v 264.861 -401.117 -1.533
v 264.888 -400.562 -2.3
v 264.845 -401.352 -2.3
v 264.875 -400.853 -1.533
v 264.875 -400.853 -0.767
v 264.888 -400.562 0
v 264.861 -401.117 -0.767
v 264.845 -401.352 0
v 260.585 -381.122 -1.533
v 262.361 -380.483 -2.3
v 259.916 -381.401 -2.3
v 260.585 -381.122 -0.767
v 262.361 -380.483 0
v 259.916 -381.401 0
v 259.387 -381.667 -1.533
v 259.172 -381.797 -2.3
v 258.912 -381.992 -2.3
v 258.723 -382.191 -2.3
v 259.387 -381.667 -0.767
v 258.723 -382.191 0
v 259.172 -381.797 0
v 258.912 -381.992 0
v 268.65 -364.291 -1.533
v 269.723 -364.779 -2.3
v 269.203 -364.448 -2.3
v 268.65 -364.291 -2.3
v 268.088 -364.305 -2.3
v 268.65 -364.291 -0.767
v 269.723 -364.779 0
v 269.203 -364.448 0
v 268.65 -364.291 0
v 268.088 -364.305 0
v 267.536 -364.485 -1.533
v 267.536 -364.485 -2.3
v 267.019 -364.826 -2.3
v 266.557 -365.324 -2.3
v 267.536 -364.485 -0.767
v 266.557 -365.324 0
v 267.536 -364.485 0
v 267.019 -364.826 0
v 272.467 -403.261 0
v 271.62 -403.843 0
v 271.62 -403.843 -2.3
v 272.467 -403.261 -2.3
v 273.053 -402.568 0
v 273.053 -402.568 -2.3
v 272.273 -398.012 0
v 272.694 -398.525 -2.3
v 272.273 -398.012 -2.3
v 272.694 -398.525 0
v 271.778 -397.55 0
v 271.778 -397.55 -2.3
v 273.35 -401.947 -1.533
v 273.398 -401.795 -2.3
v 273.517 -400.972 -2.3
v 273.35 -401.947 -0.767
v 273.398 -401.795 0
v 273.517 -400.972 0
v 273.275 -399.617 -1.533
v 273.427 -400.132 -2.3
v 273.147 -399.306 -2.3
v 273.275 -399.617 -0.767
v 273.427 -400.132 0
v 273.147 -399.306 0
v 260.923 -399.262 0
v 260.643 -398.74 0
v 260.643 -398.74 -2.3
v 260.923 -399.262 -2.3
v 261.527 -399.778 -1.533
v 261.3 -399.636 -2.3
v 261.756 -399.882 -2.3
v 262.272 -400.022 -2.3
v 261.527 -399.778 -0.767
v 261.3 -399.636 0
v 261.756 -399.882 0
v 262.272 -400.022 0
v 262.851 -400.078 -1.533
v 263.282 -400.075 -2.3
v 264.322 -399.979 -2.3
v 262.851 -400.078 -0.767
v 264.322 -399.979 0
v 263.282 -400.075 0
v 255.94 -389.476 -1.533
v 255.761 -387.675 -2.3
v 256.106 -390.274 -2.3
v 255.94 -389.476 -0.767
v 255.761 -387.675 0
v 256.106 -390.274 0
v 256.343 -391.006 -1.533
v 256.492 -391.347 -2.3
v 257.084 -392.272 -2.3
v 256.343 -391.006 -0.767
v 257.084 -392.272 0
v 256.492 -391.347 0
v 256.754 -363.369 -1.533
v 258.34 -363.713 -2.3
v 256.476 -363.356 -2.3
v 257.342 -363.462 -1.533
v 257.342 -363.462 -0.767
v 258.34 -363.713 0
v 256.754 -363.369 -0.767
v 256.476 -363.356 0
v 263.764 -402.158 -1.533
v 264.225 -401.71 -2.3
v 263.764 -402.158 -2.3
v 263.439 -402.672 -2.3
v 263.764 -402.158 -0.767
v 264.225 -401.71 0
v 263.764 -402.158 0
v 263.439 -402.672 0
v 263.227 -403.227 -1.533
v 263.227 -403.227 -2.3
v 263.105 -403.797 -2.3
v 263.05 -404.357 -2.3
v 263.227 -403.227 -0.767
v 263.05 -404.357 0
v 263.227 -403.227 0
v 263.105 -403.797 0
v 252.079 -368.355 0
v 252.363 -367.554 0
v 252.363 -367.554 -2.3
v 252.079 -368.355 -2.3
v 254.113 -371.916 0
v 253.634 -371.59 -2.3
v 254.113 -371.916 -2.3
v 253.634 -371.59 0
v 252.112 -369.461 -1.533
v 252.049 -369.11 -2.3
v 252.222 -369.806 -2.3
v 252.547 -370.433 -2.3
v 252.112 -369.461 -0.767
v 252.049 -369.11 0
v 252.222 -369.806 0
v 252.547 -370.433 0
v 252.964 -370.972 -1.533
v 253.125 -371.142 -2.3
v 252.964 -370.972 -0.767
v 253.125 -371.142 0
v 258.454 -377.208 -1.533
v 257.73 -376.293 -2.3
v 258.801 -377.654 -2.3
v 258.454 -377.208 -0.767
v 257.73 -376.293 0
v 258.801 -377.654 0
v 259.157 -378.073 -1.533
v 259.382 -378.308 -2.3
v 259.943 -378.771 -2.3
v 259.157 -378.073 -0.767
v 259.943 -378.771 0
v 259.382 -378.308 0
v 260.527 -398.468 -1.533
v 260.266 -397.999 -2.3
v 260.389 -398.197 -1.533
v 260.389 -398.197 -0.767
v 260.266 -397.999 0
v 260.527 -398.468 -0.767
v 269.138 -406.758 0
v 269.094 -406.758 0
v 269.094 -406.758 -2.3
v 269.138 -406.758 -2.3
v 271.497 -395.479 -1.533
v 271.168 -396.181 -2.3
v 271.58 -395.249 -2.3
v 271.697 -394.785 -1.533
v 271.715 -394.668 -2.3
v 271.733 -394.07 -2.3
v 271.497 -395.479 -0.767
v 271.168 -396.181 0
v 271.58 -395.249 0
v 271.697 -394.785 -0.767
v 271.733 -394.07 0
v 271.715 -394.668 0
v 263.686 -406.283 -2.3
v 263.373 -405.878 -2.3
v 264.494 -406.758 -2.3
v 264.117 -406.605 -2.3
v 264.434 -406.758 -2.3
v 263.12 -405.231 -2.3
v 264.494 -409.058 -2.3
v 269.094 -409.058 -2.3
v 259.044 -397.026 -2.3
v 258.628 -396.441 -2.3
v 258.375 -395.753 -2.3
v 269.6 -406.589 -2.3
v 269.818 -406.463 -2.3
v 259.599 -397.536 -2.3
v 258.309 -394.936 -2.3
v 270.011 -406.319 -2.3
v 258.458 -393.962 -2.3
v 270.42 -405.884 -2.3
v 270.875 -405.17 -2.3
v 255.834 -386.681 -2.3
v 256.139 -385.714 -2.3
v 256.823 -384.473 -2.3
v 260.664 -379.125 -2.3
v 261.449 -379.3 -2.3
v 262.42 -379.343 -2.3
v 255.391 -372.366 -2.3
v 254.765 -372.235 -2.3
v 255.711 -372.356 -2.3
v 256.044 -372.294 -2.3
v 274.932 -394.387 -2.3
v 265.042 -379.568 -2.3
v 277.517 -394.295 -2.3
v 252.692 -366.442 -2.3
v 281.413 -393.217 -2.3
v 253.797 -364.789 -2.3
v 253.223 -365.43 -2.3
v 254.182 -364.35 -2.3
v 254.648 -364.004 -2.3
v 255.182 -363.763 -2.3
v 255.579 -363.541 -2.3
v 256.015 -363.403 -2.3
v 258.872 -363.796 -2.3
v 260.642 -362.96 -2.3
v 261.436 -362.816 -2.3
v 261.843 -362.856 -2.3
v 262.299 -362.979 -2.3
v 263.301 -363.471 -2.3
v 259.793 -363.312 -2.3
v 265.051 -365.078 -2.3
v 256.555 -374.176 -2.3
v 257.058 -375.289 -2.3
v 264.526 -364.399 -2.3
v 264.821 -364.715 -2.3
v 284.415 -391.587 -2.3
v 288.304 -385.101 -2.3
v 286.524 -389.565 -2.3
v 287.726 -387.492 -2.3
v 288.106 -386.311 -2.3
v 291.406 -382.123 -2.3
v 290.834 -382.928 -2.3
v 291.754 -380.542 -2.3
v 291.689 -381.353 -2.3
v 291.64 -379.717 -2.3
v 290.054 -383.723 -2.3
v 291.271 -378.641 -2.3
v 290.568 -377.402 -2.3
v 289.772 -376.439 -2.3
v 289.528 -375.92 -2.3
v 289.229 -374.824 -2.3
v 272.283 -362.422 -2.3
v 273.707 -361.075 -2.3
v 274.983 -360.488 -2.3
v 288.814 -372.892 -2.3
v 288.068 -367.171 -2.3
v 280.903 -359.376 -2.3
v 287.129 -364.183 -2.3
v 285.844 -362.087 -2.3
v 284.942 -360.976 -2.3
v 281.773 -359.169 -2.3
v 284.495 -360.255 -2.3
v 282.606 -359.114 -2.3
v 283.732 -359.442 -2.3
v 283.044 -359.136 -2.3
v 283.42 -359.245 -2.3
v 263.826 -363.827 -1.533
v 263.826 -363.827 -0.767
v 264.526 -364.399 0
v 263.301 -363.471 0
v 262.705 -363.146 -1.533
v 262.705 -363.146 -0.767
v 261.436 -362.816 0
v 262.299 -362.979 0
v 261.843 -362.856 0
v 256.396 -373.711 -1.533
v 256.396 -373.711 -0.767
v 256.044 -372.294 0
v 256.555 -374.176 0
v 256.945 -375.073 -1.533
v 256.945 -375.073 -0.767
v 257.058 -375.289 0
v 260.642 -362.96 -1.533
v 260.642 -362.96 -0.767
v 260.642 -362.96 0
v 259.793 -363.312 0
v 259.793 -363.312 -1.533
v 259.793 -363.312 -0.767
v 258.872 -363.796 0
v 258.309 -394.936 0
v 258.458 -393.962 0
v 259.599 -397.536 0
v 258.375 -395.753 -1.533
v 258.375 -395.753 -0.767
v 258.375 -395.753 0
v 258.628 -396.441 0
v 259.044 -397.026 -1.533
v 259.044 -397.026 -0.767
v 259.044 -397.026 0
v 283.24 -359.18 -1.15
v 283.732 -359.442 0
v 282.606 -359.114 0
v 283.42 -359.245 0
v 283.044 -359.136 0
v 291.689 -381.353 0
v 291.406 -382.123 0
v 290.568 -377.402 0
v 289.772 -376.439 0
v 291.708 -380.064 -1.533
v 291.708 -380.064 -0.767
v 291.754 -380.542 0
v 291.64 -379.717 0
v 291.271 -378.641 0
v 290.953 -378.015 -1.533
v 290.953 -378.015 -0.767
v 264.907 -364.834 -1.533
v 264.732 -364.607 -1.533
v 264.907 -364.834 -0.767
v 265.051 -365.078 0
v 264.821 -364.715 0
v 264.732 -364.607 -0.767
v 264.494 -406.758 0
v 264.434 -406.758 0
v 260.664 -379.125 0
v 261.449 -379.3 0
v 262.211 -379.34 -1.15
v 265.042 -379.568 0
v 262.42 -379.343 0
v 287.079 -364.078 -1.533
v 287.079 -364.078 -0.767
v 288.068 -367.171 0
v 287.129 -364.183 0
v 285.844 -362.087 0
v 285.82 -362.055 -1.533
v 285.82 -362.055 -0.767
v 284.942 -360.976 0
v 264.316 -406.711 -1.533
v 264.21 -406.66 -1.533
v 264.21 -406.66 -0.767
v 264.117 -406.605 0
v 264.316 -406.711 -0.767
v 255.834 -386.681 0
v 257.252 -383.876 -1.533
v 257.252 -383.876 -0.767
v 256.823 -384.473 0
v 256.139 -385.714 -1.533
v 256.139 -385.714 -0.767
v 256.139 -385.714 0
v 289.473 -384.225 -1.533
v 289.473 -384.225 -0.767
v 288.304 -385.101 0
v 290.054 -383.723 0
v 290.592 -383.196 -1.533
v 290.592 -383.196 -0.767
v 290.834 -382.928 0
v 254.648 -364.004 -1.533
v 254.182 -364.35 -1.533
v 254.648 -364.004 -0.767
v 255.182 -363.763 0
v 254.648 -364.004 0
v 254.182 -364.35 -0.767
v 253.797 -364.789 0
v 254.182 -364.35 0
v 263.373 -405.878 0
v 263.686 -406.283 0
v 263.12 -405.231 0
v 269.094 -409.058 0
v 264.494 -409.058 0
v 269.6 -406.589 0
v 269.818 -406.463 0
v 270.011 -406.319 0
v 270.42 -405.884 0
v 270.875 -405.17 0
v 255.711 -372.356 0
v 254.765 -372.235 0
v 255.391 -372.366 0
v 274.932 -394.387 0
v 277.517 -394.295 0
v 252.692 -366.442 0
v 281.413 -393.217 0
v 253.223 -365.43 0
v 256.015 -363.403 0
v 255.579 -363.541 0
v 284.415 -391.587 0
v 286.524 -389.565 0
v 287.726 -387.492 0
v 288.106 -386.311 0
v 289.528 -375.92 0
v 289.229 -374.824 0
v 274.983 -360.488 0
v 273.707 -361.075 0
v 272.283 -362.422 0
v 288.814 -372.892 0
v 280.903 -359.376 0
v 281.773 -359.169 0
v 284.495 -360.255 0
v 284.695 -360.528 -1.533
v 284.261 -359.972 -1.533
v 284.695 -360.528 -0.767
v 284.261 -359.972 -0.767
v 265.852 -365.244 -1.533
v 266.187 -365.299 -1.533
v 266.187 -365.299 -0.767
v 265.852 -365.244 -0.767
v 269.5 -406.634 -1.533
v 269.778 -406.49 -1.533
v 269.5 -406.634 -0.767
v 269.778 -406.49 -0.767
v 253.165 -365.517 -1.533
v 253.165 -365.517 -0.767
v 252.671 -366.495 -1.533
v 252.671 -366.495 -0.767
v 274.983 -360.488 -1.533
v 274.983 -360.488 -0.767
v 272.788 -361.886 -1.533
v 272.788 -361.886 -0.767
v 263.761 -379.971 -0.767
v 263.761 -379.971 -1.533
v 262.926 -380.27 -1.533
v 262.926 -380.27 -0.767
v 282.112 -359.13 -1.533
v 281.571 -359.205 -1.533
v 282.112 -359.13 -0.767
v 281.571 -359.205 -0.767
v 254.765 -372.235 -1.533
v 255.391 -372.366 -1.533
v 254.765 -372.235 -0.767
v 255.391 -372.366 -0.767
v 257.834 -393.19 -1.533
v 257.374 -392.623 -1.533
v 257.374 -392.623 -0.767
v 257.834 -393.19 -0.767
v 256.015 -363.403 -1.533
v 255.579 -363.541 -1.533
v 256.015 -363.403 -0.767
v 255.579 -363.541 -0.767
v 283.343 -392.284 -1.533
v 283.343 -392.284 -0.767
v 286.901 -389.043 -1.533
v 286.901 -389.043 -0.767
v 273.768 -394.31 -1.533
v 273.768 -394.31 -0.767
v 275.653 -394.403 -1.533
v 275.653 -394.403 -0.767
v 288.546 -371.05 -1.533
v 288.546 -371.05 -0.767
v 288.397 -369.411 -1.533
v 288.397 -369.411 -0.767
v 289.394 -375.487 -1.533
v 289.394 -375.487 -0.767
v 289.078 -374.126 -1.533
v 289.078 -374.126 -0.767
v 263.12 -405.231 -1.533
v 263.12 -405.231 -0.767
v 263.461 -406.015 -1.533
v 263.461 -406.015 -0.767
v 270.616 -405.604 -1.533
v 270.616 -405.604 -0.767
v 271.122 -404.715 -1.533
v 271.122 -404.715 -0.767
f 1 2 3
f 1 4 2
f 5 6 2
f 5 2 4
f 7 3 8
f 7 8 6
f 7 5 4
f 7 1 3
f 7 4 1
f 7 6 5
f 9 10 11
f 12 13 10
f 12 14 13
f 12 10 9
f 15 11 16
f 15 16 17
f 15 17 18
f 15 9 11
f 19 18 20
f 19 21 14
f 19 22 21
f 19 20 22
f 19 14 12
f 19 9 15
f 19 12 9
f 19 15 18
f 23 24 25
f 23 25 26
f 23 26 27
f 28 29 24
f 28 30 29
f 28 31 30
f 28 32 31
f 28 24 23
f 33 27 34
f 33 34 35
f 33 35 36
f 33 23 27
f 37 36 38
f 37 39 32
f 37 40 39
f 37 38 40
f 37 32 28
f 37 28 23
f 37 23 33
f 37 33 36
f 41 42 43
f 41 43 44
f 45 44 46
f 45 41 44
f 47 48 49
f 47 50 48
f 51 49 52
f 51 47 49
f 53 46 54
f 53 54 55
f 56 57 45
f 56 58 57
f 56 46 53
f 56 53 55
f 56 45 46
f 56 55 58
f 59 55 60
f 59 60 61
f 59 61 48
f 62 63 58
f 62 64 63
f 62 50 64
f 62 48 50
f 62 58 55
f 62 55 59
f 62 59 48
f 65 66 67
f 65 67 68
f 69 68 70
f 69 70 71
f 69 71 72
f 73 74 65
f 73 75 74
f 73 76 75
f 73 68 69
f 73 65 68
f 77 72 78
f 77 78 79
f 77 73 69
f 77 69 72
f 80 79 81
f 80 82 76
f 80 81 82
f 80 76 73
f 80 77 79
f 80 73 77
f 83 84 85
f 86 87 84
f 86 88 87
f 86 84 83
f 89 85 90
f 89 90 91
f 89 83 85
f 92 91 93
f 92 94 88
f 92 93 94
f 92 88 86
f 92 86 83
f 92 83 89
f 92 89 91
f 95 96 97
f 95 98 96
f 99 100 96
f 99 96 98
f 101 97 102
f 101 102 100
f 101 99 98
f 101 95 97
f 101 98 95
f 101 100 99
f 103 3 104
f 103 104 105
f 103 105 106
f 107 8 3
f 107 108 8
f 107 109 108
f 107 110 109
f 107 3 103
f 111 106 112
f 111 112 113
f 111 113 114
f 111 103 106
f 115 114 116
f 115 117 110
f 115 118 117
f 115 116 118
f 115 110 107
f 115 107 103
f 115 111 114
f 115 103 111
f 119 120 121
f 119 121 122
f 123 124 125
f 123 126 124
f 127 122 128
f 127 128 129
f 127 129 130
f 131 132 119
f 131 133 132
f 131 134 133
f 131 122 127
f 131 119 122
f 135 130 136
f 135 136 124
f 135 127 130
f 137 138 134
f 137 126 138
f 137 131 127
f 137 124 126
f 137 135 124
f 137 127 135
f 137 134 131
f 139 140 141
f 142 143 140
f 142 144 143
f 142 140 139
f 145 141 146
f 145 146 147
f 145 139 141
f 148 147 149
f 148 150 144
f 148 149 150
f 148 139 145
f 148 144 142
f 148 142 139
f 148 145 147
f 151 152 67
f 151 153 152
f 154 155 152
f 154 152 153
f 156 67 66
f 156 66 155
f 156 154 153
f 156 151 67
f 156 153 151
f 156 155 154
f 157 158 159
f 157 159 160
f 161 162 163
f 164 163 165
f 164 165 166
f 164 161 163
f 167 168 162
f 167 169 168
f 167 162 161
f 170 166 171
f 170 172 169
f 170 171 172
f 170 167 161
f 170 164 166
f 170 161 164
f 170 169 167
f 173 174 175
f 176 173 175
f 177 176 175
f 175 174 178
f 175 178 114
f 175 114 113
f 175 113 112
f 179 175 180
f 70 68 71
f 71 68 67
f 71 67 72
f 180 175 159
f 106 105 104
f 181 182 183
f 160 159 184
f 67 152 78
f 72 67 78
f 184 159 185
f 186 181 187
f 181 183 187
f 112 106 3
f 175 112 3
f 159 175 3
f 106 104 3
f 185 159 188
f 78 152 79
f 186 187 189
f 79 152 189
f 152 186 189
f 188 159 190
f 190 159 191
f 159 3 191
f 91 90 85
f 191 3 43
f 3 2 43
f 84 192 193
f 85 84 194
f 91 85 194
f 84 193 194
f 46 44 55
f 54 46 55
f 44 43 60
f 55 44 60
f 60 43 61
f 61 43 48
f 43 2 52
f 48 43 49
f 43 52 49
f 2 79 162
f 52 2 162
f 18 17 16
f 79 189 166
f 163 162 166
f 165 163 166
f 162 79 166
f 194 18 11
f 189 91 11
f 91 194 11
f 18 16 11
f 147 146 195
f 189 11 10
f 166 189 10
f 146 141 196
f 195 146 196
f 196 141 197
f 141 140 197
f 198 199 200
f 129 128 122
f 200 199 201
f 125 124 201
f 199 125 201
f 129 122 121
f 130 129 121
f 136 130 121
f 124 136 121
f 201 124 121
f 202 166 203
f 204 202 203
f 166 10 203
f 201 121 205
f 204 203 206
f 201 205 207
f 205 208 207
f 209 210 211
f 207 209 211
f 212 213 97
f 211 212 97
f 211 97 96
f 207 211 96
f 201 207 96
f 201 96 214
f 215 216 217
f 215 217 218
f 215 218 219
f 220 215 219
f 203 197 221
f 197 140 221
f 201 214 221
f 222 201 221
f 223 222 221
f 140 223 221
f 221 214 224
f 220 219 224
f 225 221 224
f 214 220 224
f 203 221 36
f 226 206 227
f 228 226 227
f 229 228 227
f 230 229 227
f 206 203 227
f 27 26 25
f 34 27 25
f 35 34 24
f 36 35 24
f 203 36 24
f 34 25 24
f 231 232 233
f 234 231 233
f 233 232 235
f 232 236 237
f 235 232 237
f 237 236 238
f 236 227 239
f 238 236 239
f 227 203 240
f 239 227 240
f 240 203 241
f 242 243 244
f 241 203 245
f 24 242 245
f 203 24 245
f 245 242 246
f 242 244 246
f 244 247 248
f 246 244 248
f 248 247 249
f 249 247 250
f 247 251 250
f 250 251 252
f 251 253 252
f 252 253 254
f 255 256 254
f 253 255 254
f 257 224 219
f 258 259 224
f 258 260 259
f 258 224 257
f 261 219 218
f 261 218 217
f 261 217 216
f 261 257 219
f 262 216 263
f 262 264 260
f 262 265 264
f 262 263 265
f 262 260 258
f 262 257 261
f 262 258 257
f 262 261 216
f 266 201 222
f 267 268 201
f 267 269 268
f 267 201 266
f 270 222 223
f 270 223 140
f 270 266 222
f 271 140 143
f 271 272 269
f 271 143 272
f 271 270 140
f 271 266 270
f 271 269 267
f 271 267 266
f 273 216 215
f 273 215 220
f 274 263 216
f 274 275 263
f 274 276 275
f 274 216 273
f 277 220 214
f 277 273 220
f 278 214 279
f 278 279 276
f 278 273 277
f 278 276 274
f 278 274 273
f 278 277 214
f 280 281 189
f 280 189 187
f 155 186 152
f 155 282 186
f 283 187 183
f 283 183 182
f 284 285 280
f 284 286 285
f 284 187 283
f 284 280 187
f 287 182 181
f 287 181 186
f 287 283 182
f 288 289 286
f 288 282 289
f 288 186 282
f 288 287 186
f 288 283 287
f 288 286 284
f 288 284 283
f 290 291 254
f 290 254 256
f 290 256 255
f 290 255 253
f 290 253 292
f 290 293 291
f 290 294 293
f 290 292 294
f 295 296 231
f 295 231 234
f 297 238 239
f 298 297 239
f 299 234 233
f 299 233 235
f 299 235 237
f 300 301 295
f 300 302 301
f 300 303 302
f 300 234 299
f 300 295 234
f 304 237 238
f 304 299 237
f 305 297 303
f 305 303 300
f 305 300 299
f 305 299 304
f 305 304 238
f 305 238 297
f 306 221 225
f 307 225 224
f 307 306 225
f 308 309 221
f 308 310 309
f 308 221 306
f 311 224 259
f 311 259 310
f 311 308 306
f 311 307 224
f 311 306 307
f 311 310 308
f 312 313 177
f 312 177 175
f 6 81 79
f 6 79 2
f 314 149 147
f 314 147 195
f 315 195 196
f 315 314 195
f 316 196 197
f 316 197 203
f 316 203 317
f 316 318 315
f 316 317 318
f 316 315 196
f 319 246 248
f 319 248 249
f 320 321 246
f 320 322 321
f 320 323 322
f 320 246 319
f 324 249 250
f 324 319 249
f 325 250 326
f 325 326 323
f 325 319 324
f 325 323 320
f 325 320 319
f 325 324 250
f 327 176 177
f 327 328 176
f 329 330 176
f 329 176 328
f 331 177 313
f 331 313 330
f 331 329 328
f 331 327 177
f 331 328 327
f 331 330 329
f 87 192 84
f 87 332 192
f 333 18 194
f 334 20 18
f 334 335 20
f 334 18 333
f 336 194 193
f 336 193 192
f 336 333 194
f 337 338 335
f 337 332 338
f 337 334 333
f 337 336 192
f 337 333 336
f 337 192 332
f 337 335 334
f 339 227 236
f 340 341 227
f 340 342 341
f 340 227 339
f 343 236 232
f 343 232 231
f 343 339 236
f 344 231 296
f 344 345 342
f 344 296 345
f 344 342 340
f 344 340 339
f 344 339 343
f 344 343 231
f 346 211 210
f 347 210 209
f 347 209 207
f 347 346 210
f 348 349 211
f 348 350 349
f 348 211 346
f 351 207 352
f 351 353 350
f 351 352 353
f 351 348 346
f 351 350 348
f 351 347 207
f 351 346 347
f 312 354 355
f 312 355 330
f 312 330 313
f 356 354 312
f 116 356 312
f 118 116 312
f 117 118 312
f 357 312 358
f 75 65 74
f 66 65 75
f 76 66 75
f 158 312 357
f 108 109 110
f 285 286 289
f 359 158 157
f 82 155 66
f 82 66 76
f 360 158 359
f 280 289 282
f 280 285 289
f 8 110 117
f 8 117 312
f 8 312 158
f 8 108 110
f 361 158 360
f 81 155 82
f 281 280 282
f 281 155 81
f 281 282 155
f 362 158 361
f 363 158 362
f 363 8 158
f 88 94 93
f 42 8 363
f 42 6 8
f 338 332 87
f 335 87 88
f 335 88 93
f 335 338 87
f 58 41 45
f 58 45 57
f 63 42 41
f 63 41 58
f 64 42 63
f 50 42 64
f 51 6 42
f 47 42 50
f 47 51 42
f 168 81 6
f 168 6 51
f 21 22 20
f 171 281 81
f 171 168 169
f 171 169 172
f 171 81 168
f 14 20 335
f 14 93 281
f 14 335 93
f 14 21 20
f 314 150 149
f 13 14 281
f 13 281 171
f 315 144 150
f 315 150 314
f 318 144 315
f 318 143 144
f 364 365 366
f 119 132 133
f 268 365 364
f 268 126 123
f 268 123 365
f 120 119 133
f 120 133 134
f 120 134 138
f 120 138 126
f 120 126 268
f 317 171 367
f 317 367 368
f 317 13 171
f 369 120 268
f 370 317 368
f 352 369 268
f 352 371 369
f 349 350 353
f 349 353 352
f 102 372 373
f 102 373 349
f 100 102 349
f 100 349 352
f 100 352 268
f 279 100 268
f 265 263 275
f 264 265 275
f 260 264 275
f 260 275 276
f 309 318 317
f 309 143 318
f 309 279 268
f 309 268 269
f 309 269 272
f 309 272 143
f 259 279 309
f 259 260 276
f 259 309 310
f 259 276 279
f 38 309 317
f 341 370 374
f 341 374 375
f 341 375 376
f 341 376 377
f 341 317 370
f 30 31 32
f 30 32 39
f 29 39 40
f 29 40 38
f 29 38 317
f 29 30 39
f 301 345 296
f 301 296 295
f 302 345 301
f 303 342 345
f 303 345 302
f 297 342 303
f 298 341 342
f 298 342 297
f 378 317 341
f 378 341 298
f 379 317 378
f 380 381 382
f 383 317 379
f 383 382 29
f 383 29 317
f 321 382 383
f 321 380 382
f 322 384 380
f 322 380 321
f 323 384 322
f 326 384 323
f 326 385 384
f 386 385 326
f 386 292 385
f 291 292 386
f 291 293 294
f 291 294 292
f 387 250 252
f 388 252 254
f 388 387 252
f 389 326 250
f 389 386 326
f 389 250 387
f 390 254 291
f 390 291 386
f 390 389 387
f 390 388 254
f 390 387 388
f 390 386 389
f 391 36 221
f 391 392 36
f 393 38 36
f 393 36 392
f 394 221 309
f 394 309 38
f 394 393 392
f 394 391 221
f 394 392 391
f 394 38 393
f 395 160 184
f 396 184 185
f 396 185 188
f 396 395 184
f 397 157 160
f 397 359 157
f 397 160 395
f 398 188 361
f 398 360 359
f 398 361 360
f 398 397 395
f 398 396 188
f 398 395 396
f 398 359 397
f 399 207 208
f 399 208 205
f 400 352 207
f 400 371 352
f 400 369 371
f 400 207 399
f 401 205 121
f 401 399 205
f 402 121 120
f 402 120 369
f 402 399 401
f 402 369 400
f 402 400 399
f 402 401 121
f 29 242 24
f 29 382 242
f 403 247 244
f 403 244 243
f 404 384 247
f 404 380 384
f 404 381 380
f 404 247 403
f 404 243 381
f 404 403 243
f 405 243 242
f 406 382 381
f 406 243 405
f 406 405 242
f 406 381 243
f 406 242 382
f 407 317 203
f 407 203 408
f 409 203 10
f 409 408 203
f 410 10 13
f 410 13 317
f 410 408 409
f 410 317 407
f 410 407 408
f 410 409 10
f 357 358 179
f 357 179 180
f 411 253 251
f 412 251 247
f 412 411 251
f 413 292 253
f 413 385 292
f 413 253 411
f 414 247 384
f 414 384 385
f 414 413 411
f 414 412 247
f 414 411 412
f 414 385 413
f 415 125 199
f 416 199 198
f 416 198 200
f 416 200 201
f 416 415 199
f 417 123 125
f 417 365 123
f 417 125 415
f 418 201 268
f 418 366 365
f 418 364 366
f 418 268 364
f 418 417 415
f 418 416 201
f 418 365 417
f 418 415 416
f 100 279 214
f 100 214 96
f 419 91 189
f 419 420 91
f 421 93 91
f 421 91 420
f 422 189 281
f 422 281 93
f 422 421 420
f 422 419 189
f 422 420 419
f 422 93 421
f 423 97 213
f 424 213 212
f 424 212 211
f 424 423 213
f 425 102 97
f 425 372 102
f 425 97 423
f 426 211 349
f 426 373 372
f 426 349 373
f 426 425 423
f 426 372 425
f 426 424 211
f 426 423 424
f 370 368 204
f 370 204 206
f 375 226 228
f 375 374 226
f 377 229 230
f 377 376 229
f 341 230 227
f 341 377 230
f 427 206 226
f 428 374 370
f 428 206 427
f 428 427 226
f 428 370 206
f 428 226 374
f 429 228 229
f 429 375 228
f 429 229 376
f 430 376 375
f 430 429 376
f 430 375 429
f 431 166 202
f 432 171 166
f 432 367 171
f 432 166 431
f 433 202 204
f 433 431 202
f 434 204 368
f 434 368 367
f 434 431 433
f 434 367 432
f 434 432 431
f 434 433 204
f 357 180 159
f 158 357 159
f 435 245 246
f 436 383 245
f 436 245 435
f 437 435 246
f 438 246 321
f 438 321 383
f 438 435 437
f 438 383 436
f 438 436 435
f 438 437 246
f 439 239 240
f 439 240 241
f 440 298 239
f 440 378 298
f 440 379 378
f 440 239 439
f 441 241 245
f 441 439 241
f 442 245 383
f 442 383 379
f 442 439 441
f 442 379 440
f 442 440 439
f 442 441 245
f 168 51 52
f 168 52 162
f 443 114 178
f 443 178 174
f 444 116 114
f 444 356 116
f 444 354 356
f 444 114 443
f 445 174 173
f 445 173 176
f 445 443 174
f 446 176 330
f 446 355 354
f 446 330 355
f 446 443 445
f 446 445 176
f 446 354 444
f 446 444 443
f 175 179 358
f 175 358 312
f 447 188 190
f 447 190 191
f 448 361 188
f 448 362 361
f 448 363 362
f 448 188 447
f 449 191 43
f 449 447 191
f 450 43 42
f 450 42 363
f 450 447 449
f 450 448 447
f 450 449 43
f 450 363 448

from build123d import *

# Parameters (mm, degrees)
BASE_FLANGE1_DEPTH = 2.3
SKETCH9_W          = 4.6
SKETCH9_H          = 2.3
TAB2_DEPTH         = 2.3


# Sheet-metal steps are written as plain solids
with BuildPart() as part:
    # Model → Base-Flange1 (new body)
    with BuildSketch(Plane.XY):
        with BuildLine():
            Line((258.872397146, -363.795578641), (258.340446595, -363.712963676))
            add(Edge.make_bspline(
                [(258.340446595, -363.712963676), (257.102172757, -363.356215382), (256.632698326, -363.356215382), (256.475502968, -363.356215382)],
                knots=[8, 8, 8, 8, 9, 9, 9, 9], degree=3))
            add(Edge.make_bspline(
                [(256.475502968, -363.356215382), (256.009003058, -363.35446041), (255.553436381, -363.502578837), (255.181961013, -363.763135862)],
                knots=[9, 9, 9, 9, 10, 10, 10, 10], degree=3))
            add(Edge.make_bspline(
                [(255.181961013, -363.763135862), (254.61935208, -363.947490852), (254.137386149, -364.308582381), (253.796684542, -364.788996088)],
                knots=[10, 10, 10, 10, 11, 11, 11, 11], degree=3))
            add(Edge.make_bspline(
                [(253.796684542, -364.788996088), (253.112631486, -365.335540723), (252.561980801, -366.509985051), (252.363347956, -367.554213129)],
                knots=[11, 11, 11, 11, 12, 12, 12, 12], degree=3))
            add(Edge.make_bspline(
                [(252.363347956, -367.554213129), (251.292298247, -369.601129513), (253.084159031, -371.313241657), (254.113075303, -371.91607939)],
                knots=[12, 12, 12, 12, 13, 13, 13, 13], degree=3))
            add(Edge.make_bspline(
                [(254.113075303, -371.91607939), (254.794385244, -372.323972969), (255.361618749, -372.472065776), (256.043631973, -372.294282429)],
                knots=[13, 13, 13, 13, 14, 14, 14, 14], degree=3))
            add(Edge.make_bspline(
                [(256.043631973, -372.294282429), (256.310734133, -373.710026601), (256.813020202, -375.173008438), (257.730121712, -376.292814147)],
                knots=[14, 14, 14, 14, 15, 15, 15, 15], degree=3))
            add(Edge.make_bspline(
                [(257.730121712, -376.292814147), (258.497979568, -377.192653975), (259.081240118, -378.196938842), (259.942517788, -378.7705408)],
                knots=[15, 15, 15, 15, 16, 16, 16, 16], degree=3))
            add(Edge.make_bspline(
                [(259.942517788, -378.7705408), (260.701869281, -379.27216983), (261.5153583, -379.339786124), (262.210960953, -379.339786124)],
                knots=[16, 16, 16, 16, 17, 17, 17, 17], degree=3))
            add(Edge.make_bspline(
                [(262.210960953, -379.339786124), (262.817976246, -379.339786124), (263.929003467, -379.435932499), (265.041776853, -379.568067535)],
                knots=[17, 17, 17, 17, 18, 18, 18, 18], degree=3))
            add(Edge.make_bspline(
                [(265.041776853, -379.568067535), (263.479630225, -380.029561986), (262.850723669, -380.306968395), (262.360517171, -380.482783945)],
                knots=[18, 18, 18, 18, 19, 19, 19, 19], degree=3))
            add(Edge.make_bspline(
                [(262.360517171, -380.482783945), (260.282574516, -381.193217879), (259.133330439, -381.652890954), (258.722514931, -382.190846024)],
                knots=[19, 19, 19, 19, 20, 20, 20, 20], degree=3))
            add(Edge.make_bspline(
                [(258.722514931, -382.190846024), (257.20038636, -383.790652427), (255.644784401, -385.661685175), (255.760676668, -387.675462928)],
                knots=[20, 20, 20, 20, 21, 21, 21, 21], degree=3))
            add(Edge.make_bspline(
                [(255.760676668, -387.675462928), (255.867797332, -389.612775698), (256.133904584, -391.135833734), (257.084365946, -392.271575533)],
                knots=[21, 21, 21, 21, 22, 22, 22, 22], degree=3))
            add(Edge.make_bspline(
                [(257.084365946, -392.271575533), (257.285702702, -392.51196185), (257.755583218, -393.090348122), (258.457865963, -393.961982878)],
                knots=[22, 22, 22, 22, 23, 23, 23, 23], degree=3))
            add(Edge.make_bspline(
                [(258.457865963, -393.961982878), (257.930741372, -396.086078132), (258.835917618, -397.102047436), (260.265632875, -397.998581877)],
                knots=[23, 23, 23, 23, 24, 24, 24, 24], degree=3))
            add(Edge.make_bspline(
                [(260.265632875, -397.998581877), (260.369387496, -398.137238074), (260.55017637, -398.490440486), (260.642946402, -398.740282488)],
                knots=[24, 24, 24, 24, 25, 25, 25, 25], degree=3))
            add(Edge.make_bspline(
                [(260.642946402, -398.740282488), (261.209875025, -400.259574159), (262.875440397, -400.164932984), (264.322499466, -399.979425454)],
                knots=[25, 25, 25, 25, 26, 26, 26, 26], degree=3))
            Line((264.322499466, -399.979425454), (264.887586522, -400.562131996))
            add(Edge.make_bspline(
                [(264.887586522, -400.562131996), (264.876114631, -400.864224805), (264.860967675, -401.133752563), (264.845150679, -401.351600116)],
                knots=[27, 27, 27, 27, 28, 28, 28, 28], degree=3))
            add(Edge.make_bspline(
                [(264.845150679, -401.351600116), (263.430338911, -401.96024249), (263.109530454, -403.263240278), (263.049723659, -404.357047591)],
                knots=[28, 28, 28, 28, 29, 29, 29, 29], degree=3))
            add(Edge.make_bspline(
                [(263.049723659, -404.357047591), (263.001341567, -405.241908361), (263.287078244, -406.147201915), (264.116888391, -406.604878935)],
                knots=[29, 29, 29, 29, 30, 30, 30, 30], degree=3))
            add(Edge.make_bspline(
                [(264.116888391, -406.604878935), (264.203538156, -406.661659444), (264.310476644, -406.712599047), (264.434195613, -406.757853518)],
                knots=[30, 30, 30, 30, 31, 31, 31, 31], degree=3))
            Line((264.434195613, -406.757853518), (269.137586815, -406.757772651))
            add(Edge.make_bspline(
                [(269.137586815, -406.757772651), (269.556913154, -406.643398105), (269.785512137, -406.504655605), (270.011173306, -406.318505513)],
                knots=[32, 32, 32, 32, 33, 33, 33, 33], degree=3))
            add(Edge.make_bspline(
                [(270.011173306, -406.318505513), (270.694394242, -405.754909925), (271.096364494, -404.643678371), (271.619799516, -403.843009885)],
                knots=[33, 33, 33, 33, 34, 34, 34, 34], degree=3))
            add(Edge.make_bspline(
                [(271.619799516, -403.843009885), (274.380082617, -402.39542121), (273.859011699, -399.252989356), (271.778172518, -397.549885205)],
                knots=[34, 34, 34, 34, 35, 35, 35, 35], degree=3))
            Line((271.778172518, -397.549885205), (271.168172503, -396.180971124))
            add(Edge.make_bspline(
                [(271.168172503, -396.180971124), (271.55056252, -395.46553604), (271.790347913, -394.805938132), (271.732508302, -394.069948859)],
                knots=[36, 36, 36, 36, 37, 37, 37, 37], degree=3))
            add(Edge.make_bspline(
                [(271.732508302, -394.069948859), (273.88580142, -394.364785311), (275.621007018, -394.52101491), (277.517405963, -394.295481162)],
                knots=[37, 37, 37, 37, 38, 38, 38, 38], degree=3))
            add(Edge.make_bspline(
                [(277.517405963, -394.295481162), (284.51411226, -393.074010998), (287.940203407, -389.217208572), (288.3042126, -385.101436138)],
                knots=[38, 38, 38, 38, 39, 39, 39, 39], degree=3))
            add(Edge.make_bspline(
                [(288.3042126, -385.101436138), (289.412965748, -384.337033733), (290.82871887, -383.182054508), (291.406089985, -382.122773329)],
                knots=[39, 39, 39, 39, 40, 40, 40, 40], degree=3))
            add(Edge.make_bspline(
                [(291.406089985, -382.122773329), (292.446214832, -380.214110858), (290.955843661, -377.623538676), (289.772106988, -376.438928923)],
                knots=[40, 40, 40, 40, 41, 41, 41, 41], degree=3))
            add(Edge.make_bspline(
                [(289.772106988, -376.438928923), (289.360991342, -375.871352456), (289.054644482, -373.883183799), (288.814254345, -372.892357973)],
                knots=[41, 41, 41, 41, 42, 42, 42, 42], degree=3))
            add(Edge.make_bspline(
                [(288.814254345, -372.892357973), (288.385386538, -370.678365432), (288.588190274, -369.981235925), (288.067737839, -367.171102485)],
                knots=[42, 42, 42, 42, 43, 43, 43, 43], degree=3))
            add(Edge.make_bspline(
                [(288.067737839, -367.171102485), (287.429932713, -363.50021078), (285.413229012, -361.625957626), (284.941866287, -360.97594047)],
                knots=[43, 43, 43, 43, 44, 44, 44, 44], degree=3))
            add(Edge.make_bspline(
                [(284.941866287, -360.97594047), (284.819260833, -360.628471203), (284.276915253, -359.912923043), (283.73194671, -359.442080556)],
                knots=[44, 44, 44, 44, 45, 45, 45, 45], degree=3))
            add(Edge.make_bspline(
                [(283.73194671, -359.442080556), (283.311019249, -359.081440044), (282.605772307, -359.113922017)],
                knots=[45, 45, 45, 46, 46, 46], degree=2))
            add(Edge.make_bspline(
                [(282.605772307, -359.113922017), (282.107222216, -359.113922017), (281.662947649, -359.143891723), (280.902777541, -359.375820909)],
                knots=[0, 0, 0, 0, 1, 1, 1, 1], degree=3))
            add(Edge.make_bspline(
                [(280.902777541, -359.375820909), (271.588289586, -360.747860342), (274.754006955, -360.734792281), (269.723440936, -364.779208584)],
                knots=[1, 1, 1, 1, 2, 2, 2, 2], degree=3))
            add(Edge.make_bspline(
                [(269.723440936, -364.779208584), (268.729495671, -363.9377214), (267.410421226, -364.174392622), (266.557304967, -365.323649821)],
                knots=[2, 2, 2, 2, 3, 3, 3, 3], degree=3))
            add(Edge.make_bspline(
                [(266.557304967, -365.323649821), (266.001832387, -365.28688041), (266.252058122, -365.327222346), (265.051482275, -365.078128088)],
                knots=[3, 3, 3, 3, 4, 4, 4, 4], degree=3))
            add(Edge.make_bspline(
                [(265.051482275, -365.078128088), (264.923261056, -364.826533524), (264.747284285, -364.595969706), (264.52627273, -364.398663812)],
                knots=[4, 4, 4, 4, 5, 5, 5, 5], degree=3))
            add(Edge.make_bspline(
                [(264.52627273, -364.398663812), (264.1268682, -364.035394357), (262.68900377, -362.816385477), (261.436192103, -362.816140934)],
                knots=[5, 5, 5, 5, 6, 6, 6, 6], degree=3))
            add(Edge.make_bspline(
                [(261.436192103, -362.816140934), (260.662749573, -362.831743514), (259.83594122, -363.270833806), (258.872397146, -363.795578641)],
                knots=[6, 6, 6, 6, 7, 7, 7, 7], degree=3))
        make_face()
    extrude(amount=-BASE_FLANGE1_DEPTH)

    # Sketch9 → Tab2 (add)
    with BuildSketch(Plane.XY):
        with Locations((266.794458406, -407.907773393)):
            Rectangle(SKETCH9_W, SKETCH9_H)
    extrude(amount=-TAB2_DEPTH)


solid = part.part
